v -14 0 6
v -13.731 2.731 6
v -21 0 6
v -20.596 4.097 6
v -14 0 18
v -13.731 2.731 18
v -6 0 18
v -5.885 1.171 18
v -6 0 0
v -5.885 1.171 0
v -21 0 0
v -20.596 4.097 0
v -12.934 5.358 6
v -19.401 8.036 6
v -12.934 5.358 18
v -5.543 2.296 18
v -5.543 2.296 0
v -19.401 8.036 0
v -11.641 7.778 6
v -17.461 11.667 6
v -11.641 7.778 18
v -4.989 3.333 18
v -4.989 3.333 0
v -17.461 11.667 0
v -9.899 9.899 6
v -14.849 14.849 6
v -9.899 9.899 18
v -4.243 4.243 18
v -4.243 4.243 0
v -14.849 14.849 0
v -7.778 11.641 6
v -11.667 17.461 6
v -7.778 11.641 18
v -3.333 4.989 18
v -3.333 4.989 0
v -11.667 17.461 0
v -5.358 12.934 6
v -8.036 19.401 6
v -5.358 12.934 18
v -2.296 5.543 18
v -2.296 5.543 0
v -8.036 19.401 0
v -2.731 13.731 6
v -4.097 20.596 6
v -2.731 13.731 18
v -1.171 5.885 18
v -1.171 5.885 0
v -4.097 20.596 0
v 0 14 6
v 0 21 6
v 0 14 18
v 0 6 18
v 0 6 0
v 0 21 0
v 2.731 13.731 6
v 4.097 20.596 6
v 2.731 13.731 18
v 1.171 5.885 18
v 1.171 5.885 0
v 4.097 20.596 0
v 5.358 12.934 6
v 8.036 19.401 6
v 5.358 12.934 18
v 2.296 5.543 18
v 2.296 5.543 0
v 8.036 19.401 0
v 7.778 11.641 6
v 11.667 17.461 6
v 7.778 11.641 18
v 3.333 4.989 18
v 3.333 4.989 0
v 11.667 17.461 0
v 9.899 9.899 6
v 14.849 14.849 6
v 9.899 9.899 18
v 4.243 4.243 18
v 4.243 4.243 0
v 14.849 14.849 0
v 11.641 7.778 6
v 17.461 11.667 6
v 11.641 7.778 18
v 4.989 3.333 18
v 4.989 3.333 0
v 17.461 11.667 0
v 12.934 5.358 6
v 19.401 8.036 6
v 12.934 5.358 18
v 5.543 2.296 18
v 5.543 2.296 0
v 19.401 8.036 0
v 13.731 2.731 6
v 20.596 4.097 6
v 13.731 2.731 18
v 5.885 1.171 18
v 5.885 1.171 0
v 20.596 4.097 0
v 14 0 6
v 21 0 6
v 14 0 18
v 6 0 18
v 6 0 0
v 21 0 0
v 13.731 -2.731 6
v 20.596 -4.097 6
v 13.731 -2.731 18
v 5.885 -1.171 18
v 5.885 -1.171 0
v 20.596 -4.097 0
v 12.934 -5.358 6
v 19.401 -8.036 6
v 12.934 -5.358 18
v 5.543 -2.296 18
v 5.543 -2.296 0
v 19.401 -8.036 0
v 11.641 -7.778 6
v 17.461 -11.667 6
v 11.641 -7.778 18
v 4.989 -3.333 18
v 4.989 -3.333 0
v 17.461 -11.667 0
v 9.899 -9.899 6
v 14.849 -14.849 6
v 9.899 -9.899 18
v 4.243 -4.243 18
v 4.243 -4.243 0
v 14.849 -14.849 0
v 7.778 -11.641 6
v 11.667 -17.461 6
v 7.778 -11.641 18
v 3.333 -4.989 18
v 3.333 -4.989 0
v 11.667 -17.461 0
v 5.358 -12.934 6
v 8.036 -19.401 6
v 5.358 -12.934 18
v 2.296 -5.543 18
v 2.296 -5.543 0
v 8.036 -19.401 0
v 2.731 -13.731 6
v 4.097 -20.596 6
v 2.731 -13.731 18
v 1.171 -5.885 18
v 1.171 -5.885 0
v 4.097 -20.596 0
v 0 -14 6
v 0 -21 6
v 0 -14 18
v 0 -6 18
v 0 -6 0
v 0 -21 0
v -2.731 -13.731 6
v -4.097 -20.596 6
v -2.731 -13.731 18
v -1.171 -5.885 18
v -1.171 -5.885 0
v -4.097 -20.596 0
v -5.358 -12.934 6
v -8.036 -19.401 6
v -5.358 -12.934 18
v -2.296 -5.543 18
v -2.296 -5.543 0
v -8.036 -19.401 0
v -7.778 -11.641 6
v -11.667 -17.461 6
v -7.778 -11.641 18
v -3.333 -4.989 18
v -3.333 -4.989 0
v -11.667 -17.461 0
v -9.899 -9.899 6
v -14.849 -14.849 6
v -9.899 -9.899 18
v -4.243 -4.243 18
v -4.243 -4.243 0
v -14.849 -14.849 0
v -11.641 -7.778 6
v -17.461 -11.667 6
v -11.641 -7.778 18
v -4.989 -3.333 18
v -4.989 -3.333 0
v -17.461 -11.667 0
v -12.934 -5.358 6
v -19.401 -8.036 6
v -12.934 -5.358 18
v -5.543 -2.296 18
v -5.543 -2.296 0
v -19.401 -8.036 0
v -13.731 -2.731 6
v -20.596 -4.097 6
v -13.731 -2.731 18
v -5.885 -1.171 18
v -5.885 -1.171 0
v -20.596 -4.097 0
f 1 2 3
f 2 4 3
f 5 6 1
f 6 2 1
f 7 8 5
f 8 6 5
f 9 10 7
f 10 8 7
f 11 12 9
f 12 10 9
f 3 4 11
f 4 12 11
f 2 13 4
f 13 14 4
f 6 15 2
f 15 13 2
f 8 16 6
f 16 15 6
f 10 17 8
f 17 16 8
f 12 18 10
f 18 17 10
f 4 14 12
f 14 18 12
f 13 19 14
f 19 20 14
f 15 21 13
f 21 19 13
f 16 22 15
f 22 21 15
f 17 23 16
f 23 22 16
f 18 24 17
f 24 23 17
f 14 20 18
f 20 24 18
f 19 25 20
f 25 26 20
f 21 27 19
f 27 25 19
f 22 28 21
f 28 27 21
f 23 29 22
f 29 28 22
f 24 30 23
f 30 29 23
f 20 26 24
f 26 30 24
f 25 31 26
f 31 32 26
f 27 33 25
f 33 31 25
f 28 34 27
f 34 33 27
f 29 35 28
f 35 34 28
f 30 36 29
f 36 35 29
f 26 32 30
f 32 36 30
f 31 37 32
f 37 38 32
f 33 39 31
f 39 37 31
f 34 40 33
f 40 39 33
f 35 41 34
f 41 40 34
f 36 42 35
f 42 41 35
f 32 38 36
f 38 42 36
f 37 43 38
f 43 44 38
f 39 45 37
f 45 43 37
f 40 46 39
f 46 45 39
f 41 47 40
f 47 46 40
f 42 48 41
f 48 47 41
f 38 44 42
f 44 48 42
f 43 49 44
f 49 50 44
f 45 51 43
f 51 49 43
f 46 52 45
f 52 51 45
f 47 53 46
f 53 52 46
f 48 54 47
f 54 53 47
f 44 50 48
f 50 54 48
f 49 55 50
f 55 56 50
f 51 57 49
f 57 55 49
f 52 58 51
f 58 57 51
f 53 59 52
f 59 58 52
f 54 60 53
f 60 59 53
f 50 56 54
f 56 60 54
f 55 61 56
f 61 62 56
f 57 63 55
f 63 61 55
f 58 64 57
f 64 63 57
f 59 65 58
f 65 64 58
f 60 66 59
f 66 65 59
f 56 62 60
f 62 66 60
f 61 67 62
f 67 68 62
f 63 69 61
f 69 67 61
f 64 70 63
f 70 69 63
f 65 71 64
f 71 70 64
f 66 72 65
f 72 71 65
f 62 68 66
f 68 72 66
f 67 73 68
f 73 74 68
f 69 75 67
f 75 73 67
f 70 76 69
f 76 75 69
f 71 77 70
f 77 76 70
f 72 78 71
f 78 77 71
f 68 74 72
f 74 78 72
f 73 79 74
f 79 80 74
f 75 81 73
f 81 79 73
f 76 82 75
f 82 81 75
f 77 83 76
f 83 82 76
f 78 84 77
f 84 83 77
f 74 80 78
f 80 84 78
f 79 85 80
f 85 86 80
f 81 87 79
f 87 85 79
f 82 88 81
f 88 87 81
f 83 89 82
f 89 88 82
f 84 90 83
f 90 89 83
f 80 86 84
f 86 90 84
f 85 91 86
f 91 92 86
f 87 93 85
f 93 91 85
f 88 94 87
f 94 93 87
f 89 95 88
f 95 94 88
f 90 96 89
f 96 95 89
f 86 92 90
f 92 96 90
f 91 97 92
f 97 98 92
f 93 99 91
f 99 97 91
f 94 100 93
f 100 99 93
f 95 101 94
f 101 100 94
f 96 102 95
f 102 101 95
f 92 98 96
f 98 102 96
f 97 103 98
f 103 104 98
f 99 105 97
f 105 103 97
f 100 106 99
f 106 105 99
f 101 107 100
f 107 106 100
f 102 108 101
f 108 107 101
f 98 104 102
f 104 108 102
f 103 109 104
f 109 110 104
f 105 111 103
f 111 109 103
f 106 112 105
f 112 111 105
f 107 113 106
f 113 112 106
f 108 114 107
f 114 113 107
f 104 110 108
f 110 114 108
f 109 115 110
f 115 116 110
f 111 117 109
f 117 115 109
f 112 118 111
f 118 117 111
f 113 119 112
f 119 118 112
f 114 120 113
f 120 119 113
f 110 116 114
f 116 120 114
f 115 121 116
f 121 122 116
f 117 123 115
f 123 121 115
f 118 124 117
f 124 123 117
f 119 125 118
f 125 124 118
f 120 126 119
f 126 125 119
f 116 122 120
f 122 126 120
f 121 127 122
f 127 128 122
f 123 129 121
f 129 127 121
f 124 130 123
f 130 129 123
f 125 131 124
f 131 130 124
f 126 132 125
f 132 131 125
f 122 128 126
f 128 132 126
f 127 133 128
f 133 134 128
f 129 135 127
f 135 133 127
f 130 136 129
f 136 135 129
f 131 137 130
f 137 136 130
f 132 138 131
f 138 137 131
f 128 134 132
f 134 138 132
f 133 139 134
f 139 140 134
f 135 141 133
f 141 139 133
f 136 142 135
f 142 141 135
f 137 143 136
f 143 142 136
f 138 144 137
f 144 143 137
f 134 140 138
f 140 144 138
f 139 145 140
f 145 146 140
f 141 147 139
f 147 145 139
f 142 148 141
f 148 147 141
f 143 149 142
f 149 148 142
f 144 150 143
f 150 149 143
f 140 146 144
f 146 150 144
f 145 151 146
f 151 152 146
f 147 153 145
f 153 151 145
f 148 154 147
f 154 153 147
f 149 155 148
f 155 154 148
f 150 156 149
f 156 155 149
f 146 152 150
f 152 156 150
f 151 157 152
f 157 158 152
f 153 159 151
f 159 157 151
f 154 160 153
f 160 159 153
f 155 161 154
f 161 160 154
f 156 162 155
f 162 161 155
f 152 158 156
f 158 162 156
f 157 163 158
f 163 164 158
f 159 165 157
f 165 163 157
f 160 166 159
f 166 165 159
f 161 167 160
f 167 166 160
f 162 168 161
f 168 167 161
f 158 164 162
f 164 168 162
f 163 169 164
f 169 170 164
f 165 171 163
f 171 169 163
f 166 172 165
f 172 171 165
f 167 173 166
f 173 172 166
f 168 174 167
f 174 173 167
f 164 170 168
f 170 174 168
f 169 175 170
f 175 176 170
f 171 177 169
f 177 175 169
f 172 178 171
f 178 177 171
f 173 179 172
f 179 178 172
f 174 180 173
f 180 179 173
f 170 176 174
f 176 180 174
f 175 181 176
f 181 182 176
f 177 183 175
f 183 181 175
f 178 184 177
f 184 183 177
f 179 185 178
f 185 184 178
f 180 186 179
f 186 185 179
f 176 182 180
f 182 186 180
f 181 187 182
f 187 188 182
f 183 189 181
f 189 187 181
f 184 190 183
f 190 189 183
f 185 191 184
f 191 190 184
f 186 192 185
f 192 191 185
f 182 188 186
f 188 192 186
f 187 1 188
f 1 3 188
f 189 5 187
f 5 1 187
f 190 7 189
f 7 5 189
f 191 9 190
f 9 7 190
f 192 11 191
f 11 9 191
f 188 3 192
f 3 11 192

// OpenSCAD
$fn = 32;

// ----------------------------------------------------------------------
// Arc stop: collar, 18 mm thick
// ----------------------------------------------------------------------

// --- parameters (mm) ---
revolve_angle = 360;      // full turn around the Z axis
profile_points = 6;       // points of the closed outline

profile = [[6, 0], [21, 0], [21, 6], [14, 6], [14, 18], [6, 18]];  // single closed polygon, 6 points, counter clockwise

// --- the one profile operation ---
rotate_extrude(angle = revolve_angle) polygon(points = profile);
